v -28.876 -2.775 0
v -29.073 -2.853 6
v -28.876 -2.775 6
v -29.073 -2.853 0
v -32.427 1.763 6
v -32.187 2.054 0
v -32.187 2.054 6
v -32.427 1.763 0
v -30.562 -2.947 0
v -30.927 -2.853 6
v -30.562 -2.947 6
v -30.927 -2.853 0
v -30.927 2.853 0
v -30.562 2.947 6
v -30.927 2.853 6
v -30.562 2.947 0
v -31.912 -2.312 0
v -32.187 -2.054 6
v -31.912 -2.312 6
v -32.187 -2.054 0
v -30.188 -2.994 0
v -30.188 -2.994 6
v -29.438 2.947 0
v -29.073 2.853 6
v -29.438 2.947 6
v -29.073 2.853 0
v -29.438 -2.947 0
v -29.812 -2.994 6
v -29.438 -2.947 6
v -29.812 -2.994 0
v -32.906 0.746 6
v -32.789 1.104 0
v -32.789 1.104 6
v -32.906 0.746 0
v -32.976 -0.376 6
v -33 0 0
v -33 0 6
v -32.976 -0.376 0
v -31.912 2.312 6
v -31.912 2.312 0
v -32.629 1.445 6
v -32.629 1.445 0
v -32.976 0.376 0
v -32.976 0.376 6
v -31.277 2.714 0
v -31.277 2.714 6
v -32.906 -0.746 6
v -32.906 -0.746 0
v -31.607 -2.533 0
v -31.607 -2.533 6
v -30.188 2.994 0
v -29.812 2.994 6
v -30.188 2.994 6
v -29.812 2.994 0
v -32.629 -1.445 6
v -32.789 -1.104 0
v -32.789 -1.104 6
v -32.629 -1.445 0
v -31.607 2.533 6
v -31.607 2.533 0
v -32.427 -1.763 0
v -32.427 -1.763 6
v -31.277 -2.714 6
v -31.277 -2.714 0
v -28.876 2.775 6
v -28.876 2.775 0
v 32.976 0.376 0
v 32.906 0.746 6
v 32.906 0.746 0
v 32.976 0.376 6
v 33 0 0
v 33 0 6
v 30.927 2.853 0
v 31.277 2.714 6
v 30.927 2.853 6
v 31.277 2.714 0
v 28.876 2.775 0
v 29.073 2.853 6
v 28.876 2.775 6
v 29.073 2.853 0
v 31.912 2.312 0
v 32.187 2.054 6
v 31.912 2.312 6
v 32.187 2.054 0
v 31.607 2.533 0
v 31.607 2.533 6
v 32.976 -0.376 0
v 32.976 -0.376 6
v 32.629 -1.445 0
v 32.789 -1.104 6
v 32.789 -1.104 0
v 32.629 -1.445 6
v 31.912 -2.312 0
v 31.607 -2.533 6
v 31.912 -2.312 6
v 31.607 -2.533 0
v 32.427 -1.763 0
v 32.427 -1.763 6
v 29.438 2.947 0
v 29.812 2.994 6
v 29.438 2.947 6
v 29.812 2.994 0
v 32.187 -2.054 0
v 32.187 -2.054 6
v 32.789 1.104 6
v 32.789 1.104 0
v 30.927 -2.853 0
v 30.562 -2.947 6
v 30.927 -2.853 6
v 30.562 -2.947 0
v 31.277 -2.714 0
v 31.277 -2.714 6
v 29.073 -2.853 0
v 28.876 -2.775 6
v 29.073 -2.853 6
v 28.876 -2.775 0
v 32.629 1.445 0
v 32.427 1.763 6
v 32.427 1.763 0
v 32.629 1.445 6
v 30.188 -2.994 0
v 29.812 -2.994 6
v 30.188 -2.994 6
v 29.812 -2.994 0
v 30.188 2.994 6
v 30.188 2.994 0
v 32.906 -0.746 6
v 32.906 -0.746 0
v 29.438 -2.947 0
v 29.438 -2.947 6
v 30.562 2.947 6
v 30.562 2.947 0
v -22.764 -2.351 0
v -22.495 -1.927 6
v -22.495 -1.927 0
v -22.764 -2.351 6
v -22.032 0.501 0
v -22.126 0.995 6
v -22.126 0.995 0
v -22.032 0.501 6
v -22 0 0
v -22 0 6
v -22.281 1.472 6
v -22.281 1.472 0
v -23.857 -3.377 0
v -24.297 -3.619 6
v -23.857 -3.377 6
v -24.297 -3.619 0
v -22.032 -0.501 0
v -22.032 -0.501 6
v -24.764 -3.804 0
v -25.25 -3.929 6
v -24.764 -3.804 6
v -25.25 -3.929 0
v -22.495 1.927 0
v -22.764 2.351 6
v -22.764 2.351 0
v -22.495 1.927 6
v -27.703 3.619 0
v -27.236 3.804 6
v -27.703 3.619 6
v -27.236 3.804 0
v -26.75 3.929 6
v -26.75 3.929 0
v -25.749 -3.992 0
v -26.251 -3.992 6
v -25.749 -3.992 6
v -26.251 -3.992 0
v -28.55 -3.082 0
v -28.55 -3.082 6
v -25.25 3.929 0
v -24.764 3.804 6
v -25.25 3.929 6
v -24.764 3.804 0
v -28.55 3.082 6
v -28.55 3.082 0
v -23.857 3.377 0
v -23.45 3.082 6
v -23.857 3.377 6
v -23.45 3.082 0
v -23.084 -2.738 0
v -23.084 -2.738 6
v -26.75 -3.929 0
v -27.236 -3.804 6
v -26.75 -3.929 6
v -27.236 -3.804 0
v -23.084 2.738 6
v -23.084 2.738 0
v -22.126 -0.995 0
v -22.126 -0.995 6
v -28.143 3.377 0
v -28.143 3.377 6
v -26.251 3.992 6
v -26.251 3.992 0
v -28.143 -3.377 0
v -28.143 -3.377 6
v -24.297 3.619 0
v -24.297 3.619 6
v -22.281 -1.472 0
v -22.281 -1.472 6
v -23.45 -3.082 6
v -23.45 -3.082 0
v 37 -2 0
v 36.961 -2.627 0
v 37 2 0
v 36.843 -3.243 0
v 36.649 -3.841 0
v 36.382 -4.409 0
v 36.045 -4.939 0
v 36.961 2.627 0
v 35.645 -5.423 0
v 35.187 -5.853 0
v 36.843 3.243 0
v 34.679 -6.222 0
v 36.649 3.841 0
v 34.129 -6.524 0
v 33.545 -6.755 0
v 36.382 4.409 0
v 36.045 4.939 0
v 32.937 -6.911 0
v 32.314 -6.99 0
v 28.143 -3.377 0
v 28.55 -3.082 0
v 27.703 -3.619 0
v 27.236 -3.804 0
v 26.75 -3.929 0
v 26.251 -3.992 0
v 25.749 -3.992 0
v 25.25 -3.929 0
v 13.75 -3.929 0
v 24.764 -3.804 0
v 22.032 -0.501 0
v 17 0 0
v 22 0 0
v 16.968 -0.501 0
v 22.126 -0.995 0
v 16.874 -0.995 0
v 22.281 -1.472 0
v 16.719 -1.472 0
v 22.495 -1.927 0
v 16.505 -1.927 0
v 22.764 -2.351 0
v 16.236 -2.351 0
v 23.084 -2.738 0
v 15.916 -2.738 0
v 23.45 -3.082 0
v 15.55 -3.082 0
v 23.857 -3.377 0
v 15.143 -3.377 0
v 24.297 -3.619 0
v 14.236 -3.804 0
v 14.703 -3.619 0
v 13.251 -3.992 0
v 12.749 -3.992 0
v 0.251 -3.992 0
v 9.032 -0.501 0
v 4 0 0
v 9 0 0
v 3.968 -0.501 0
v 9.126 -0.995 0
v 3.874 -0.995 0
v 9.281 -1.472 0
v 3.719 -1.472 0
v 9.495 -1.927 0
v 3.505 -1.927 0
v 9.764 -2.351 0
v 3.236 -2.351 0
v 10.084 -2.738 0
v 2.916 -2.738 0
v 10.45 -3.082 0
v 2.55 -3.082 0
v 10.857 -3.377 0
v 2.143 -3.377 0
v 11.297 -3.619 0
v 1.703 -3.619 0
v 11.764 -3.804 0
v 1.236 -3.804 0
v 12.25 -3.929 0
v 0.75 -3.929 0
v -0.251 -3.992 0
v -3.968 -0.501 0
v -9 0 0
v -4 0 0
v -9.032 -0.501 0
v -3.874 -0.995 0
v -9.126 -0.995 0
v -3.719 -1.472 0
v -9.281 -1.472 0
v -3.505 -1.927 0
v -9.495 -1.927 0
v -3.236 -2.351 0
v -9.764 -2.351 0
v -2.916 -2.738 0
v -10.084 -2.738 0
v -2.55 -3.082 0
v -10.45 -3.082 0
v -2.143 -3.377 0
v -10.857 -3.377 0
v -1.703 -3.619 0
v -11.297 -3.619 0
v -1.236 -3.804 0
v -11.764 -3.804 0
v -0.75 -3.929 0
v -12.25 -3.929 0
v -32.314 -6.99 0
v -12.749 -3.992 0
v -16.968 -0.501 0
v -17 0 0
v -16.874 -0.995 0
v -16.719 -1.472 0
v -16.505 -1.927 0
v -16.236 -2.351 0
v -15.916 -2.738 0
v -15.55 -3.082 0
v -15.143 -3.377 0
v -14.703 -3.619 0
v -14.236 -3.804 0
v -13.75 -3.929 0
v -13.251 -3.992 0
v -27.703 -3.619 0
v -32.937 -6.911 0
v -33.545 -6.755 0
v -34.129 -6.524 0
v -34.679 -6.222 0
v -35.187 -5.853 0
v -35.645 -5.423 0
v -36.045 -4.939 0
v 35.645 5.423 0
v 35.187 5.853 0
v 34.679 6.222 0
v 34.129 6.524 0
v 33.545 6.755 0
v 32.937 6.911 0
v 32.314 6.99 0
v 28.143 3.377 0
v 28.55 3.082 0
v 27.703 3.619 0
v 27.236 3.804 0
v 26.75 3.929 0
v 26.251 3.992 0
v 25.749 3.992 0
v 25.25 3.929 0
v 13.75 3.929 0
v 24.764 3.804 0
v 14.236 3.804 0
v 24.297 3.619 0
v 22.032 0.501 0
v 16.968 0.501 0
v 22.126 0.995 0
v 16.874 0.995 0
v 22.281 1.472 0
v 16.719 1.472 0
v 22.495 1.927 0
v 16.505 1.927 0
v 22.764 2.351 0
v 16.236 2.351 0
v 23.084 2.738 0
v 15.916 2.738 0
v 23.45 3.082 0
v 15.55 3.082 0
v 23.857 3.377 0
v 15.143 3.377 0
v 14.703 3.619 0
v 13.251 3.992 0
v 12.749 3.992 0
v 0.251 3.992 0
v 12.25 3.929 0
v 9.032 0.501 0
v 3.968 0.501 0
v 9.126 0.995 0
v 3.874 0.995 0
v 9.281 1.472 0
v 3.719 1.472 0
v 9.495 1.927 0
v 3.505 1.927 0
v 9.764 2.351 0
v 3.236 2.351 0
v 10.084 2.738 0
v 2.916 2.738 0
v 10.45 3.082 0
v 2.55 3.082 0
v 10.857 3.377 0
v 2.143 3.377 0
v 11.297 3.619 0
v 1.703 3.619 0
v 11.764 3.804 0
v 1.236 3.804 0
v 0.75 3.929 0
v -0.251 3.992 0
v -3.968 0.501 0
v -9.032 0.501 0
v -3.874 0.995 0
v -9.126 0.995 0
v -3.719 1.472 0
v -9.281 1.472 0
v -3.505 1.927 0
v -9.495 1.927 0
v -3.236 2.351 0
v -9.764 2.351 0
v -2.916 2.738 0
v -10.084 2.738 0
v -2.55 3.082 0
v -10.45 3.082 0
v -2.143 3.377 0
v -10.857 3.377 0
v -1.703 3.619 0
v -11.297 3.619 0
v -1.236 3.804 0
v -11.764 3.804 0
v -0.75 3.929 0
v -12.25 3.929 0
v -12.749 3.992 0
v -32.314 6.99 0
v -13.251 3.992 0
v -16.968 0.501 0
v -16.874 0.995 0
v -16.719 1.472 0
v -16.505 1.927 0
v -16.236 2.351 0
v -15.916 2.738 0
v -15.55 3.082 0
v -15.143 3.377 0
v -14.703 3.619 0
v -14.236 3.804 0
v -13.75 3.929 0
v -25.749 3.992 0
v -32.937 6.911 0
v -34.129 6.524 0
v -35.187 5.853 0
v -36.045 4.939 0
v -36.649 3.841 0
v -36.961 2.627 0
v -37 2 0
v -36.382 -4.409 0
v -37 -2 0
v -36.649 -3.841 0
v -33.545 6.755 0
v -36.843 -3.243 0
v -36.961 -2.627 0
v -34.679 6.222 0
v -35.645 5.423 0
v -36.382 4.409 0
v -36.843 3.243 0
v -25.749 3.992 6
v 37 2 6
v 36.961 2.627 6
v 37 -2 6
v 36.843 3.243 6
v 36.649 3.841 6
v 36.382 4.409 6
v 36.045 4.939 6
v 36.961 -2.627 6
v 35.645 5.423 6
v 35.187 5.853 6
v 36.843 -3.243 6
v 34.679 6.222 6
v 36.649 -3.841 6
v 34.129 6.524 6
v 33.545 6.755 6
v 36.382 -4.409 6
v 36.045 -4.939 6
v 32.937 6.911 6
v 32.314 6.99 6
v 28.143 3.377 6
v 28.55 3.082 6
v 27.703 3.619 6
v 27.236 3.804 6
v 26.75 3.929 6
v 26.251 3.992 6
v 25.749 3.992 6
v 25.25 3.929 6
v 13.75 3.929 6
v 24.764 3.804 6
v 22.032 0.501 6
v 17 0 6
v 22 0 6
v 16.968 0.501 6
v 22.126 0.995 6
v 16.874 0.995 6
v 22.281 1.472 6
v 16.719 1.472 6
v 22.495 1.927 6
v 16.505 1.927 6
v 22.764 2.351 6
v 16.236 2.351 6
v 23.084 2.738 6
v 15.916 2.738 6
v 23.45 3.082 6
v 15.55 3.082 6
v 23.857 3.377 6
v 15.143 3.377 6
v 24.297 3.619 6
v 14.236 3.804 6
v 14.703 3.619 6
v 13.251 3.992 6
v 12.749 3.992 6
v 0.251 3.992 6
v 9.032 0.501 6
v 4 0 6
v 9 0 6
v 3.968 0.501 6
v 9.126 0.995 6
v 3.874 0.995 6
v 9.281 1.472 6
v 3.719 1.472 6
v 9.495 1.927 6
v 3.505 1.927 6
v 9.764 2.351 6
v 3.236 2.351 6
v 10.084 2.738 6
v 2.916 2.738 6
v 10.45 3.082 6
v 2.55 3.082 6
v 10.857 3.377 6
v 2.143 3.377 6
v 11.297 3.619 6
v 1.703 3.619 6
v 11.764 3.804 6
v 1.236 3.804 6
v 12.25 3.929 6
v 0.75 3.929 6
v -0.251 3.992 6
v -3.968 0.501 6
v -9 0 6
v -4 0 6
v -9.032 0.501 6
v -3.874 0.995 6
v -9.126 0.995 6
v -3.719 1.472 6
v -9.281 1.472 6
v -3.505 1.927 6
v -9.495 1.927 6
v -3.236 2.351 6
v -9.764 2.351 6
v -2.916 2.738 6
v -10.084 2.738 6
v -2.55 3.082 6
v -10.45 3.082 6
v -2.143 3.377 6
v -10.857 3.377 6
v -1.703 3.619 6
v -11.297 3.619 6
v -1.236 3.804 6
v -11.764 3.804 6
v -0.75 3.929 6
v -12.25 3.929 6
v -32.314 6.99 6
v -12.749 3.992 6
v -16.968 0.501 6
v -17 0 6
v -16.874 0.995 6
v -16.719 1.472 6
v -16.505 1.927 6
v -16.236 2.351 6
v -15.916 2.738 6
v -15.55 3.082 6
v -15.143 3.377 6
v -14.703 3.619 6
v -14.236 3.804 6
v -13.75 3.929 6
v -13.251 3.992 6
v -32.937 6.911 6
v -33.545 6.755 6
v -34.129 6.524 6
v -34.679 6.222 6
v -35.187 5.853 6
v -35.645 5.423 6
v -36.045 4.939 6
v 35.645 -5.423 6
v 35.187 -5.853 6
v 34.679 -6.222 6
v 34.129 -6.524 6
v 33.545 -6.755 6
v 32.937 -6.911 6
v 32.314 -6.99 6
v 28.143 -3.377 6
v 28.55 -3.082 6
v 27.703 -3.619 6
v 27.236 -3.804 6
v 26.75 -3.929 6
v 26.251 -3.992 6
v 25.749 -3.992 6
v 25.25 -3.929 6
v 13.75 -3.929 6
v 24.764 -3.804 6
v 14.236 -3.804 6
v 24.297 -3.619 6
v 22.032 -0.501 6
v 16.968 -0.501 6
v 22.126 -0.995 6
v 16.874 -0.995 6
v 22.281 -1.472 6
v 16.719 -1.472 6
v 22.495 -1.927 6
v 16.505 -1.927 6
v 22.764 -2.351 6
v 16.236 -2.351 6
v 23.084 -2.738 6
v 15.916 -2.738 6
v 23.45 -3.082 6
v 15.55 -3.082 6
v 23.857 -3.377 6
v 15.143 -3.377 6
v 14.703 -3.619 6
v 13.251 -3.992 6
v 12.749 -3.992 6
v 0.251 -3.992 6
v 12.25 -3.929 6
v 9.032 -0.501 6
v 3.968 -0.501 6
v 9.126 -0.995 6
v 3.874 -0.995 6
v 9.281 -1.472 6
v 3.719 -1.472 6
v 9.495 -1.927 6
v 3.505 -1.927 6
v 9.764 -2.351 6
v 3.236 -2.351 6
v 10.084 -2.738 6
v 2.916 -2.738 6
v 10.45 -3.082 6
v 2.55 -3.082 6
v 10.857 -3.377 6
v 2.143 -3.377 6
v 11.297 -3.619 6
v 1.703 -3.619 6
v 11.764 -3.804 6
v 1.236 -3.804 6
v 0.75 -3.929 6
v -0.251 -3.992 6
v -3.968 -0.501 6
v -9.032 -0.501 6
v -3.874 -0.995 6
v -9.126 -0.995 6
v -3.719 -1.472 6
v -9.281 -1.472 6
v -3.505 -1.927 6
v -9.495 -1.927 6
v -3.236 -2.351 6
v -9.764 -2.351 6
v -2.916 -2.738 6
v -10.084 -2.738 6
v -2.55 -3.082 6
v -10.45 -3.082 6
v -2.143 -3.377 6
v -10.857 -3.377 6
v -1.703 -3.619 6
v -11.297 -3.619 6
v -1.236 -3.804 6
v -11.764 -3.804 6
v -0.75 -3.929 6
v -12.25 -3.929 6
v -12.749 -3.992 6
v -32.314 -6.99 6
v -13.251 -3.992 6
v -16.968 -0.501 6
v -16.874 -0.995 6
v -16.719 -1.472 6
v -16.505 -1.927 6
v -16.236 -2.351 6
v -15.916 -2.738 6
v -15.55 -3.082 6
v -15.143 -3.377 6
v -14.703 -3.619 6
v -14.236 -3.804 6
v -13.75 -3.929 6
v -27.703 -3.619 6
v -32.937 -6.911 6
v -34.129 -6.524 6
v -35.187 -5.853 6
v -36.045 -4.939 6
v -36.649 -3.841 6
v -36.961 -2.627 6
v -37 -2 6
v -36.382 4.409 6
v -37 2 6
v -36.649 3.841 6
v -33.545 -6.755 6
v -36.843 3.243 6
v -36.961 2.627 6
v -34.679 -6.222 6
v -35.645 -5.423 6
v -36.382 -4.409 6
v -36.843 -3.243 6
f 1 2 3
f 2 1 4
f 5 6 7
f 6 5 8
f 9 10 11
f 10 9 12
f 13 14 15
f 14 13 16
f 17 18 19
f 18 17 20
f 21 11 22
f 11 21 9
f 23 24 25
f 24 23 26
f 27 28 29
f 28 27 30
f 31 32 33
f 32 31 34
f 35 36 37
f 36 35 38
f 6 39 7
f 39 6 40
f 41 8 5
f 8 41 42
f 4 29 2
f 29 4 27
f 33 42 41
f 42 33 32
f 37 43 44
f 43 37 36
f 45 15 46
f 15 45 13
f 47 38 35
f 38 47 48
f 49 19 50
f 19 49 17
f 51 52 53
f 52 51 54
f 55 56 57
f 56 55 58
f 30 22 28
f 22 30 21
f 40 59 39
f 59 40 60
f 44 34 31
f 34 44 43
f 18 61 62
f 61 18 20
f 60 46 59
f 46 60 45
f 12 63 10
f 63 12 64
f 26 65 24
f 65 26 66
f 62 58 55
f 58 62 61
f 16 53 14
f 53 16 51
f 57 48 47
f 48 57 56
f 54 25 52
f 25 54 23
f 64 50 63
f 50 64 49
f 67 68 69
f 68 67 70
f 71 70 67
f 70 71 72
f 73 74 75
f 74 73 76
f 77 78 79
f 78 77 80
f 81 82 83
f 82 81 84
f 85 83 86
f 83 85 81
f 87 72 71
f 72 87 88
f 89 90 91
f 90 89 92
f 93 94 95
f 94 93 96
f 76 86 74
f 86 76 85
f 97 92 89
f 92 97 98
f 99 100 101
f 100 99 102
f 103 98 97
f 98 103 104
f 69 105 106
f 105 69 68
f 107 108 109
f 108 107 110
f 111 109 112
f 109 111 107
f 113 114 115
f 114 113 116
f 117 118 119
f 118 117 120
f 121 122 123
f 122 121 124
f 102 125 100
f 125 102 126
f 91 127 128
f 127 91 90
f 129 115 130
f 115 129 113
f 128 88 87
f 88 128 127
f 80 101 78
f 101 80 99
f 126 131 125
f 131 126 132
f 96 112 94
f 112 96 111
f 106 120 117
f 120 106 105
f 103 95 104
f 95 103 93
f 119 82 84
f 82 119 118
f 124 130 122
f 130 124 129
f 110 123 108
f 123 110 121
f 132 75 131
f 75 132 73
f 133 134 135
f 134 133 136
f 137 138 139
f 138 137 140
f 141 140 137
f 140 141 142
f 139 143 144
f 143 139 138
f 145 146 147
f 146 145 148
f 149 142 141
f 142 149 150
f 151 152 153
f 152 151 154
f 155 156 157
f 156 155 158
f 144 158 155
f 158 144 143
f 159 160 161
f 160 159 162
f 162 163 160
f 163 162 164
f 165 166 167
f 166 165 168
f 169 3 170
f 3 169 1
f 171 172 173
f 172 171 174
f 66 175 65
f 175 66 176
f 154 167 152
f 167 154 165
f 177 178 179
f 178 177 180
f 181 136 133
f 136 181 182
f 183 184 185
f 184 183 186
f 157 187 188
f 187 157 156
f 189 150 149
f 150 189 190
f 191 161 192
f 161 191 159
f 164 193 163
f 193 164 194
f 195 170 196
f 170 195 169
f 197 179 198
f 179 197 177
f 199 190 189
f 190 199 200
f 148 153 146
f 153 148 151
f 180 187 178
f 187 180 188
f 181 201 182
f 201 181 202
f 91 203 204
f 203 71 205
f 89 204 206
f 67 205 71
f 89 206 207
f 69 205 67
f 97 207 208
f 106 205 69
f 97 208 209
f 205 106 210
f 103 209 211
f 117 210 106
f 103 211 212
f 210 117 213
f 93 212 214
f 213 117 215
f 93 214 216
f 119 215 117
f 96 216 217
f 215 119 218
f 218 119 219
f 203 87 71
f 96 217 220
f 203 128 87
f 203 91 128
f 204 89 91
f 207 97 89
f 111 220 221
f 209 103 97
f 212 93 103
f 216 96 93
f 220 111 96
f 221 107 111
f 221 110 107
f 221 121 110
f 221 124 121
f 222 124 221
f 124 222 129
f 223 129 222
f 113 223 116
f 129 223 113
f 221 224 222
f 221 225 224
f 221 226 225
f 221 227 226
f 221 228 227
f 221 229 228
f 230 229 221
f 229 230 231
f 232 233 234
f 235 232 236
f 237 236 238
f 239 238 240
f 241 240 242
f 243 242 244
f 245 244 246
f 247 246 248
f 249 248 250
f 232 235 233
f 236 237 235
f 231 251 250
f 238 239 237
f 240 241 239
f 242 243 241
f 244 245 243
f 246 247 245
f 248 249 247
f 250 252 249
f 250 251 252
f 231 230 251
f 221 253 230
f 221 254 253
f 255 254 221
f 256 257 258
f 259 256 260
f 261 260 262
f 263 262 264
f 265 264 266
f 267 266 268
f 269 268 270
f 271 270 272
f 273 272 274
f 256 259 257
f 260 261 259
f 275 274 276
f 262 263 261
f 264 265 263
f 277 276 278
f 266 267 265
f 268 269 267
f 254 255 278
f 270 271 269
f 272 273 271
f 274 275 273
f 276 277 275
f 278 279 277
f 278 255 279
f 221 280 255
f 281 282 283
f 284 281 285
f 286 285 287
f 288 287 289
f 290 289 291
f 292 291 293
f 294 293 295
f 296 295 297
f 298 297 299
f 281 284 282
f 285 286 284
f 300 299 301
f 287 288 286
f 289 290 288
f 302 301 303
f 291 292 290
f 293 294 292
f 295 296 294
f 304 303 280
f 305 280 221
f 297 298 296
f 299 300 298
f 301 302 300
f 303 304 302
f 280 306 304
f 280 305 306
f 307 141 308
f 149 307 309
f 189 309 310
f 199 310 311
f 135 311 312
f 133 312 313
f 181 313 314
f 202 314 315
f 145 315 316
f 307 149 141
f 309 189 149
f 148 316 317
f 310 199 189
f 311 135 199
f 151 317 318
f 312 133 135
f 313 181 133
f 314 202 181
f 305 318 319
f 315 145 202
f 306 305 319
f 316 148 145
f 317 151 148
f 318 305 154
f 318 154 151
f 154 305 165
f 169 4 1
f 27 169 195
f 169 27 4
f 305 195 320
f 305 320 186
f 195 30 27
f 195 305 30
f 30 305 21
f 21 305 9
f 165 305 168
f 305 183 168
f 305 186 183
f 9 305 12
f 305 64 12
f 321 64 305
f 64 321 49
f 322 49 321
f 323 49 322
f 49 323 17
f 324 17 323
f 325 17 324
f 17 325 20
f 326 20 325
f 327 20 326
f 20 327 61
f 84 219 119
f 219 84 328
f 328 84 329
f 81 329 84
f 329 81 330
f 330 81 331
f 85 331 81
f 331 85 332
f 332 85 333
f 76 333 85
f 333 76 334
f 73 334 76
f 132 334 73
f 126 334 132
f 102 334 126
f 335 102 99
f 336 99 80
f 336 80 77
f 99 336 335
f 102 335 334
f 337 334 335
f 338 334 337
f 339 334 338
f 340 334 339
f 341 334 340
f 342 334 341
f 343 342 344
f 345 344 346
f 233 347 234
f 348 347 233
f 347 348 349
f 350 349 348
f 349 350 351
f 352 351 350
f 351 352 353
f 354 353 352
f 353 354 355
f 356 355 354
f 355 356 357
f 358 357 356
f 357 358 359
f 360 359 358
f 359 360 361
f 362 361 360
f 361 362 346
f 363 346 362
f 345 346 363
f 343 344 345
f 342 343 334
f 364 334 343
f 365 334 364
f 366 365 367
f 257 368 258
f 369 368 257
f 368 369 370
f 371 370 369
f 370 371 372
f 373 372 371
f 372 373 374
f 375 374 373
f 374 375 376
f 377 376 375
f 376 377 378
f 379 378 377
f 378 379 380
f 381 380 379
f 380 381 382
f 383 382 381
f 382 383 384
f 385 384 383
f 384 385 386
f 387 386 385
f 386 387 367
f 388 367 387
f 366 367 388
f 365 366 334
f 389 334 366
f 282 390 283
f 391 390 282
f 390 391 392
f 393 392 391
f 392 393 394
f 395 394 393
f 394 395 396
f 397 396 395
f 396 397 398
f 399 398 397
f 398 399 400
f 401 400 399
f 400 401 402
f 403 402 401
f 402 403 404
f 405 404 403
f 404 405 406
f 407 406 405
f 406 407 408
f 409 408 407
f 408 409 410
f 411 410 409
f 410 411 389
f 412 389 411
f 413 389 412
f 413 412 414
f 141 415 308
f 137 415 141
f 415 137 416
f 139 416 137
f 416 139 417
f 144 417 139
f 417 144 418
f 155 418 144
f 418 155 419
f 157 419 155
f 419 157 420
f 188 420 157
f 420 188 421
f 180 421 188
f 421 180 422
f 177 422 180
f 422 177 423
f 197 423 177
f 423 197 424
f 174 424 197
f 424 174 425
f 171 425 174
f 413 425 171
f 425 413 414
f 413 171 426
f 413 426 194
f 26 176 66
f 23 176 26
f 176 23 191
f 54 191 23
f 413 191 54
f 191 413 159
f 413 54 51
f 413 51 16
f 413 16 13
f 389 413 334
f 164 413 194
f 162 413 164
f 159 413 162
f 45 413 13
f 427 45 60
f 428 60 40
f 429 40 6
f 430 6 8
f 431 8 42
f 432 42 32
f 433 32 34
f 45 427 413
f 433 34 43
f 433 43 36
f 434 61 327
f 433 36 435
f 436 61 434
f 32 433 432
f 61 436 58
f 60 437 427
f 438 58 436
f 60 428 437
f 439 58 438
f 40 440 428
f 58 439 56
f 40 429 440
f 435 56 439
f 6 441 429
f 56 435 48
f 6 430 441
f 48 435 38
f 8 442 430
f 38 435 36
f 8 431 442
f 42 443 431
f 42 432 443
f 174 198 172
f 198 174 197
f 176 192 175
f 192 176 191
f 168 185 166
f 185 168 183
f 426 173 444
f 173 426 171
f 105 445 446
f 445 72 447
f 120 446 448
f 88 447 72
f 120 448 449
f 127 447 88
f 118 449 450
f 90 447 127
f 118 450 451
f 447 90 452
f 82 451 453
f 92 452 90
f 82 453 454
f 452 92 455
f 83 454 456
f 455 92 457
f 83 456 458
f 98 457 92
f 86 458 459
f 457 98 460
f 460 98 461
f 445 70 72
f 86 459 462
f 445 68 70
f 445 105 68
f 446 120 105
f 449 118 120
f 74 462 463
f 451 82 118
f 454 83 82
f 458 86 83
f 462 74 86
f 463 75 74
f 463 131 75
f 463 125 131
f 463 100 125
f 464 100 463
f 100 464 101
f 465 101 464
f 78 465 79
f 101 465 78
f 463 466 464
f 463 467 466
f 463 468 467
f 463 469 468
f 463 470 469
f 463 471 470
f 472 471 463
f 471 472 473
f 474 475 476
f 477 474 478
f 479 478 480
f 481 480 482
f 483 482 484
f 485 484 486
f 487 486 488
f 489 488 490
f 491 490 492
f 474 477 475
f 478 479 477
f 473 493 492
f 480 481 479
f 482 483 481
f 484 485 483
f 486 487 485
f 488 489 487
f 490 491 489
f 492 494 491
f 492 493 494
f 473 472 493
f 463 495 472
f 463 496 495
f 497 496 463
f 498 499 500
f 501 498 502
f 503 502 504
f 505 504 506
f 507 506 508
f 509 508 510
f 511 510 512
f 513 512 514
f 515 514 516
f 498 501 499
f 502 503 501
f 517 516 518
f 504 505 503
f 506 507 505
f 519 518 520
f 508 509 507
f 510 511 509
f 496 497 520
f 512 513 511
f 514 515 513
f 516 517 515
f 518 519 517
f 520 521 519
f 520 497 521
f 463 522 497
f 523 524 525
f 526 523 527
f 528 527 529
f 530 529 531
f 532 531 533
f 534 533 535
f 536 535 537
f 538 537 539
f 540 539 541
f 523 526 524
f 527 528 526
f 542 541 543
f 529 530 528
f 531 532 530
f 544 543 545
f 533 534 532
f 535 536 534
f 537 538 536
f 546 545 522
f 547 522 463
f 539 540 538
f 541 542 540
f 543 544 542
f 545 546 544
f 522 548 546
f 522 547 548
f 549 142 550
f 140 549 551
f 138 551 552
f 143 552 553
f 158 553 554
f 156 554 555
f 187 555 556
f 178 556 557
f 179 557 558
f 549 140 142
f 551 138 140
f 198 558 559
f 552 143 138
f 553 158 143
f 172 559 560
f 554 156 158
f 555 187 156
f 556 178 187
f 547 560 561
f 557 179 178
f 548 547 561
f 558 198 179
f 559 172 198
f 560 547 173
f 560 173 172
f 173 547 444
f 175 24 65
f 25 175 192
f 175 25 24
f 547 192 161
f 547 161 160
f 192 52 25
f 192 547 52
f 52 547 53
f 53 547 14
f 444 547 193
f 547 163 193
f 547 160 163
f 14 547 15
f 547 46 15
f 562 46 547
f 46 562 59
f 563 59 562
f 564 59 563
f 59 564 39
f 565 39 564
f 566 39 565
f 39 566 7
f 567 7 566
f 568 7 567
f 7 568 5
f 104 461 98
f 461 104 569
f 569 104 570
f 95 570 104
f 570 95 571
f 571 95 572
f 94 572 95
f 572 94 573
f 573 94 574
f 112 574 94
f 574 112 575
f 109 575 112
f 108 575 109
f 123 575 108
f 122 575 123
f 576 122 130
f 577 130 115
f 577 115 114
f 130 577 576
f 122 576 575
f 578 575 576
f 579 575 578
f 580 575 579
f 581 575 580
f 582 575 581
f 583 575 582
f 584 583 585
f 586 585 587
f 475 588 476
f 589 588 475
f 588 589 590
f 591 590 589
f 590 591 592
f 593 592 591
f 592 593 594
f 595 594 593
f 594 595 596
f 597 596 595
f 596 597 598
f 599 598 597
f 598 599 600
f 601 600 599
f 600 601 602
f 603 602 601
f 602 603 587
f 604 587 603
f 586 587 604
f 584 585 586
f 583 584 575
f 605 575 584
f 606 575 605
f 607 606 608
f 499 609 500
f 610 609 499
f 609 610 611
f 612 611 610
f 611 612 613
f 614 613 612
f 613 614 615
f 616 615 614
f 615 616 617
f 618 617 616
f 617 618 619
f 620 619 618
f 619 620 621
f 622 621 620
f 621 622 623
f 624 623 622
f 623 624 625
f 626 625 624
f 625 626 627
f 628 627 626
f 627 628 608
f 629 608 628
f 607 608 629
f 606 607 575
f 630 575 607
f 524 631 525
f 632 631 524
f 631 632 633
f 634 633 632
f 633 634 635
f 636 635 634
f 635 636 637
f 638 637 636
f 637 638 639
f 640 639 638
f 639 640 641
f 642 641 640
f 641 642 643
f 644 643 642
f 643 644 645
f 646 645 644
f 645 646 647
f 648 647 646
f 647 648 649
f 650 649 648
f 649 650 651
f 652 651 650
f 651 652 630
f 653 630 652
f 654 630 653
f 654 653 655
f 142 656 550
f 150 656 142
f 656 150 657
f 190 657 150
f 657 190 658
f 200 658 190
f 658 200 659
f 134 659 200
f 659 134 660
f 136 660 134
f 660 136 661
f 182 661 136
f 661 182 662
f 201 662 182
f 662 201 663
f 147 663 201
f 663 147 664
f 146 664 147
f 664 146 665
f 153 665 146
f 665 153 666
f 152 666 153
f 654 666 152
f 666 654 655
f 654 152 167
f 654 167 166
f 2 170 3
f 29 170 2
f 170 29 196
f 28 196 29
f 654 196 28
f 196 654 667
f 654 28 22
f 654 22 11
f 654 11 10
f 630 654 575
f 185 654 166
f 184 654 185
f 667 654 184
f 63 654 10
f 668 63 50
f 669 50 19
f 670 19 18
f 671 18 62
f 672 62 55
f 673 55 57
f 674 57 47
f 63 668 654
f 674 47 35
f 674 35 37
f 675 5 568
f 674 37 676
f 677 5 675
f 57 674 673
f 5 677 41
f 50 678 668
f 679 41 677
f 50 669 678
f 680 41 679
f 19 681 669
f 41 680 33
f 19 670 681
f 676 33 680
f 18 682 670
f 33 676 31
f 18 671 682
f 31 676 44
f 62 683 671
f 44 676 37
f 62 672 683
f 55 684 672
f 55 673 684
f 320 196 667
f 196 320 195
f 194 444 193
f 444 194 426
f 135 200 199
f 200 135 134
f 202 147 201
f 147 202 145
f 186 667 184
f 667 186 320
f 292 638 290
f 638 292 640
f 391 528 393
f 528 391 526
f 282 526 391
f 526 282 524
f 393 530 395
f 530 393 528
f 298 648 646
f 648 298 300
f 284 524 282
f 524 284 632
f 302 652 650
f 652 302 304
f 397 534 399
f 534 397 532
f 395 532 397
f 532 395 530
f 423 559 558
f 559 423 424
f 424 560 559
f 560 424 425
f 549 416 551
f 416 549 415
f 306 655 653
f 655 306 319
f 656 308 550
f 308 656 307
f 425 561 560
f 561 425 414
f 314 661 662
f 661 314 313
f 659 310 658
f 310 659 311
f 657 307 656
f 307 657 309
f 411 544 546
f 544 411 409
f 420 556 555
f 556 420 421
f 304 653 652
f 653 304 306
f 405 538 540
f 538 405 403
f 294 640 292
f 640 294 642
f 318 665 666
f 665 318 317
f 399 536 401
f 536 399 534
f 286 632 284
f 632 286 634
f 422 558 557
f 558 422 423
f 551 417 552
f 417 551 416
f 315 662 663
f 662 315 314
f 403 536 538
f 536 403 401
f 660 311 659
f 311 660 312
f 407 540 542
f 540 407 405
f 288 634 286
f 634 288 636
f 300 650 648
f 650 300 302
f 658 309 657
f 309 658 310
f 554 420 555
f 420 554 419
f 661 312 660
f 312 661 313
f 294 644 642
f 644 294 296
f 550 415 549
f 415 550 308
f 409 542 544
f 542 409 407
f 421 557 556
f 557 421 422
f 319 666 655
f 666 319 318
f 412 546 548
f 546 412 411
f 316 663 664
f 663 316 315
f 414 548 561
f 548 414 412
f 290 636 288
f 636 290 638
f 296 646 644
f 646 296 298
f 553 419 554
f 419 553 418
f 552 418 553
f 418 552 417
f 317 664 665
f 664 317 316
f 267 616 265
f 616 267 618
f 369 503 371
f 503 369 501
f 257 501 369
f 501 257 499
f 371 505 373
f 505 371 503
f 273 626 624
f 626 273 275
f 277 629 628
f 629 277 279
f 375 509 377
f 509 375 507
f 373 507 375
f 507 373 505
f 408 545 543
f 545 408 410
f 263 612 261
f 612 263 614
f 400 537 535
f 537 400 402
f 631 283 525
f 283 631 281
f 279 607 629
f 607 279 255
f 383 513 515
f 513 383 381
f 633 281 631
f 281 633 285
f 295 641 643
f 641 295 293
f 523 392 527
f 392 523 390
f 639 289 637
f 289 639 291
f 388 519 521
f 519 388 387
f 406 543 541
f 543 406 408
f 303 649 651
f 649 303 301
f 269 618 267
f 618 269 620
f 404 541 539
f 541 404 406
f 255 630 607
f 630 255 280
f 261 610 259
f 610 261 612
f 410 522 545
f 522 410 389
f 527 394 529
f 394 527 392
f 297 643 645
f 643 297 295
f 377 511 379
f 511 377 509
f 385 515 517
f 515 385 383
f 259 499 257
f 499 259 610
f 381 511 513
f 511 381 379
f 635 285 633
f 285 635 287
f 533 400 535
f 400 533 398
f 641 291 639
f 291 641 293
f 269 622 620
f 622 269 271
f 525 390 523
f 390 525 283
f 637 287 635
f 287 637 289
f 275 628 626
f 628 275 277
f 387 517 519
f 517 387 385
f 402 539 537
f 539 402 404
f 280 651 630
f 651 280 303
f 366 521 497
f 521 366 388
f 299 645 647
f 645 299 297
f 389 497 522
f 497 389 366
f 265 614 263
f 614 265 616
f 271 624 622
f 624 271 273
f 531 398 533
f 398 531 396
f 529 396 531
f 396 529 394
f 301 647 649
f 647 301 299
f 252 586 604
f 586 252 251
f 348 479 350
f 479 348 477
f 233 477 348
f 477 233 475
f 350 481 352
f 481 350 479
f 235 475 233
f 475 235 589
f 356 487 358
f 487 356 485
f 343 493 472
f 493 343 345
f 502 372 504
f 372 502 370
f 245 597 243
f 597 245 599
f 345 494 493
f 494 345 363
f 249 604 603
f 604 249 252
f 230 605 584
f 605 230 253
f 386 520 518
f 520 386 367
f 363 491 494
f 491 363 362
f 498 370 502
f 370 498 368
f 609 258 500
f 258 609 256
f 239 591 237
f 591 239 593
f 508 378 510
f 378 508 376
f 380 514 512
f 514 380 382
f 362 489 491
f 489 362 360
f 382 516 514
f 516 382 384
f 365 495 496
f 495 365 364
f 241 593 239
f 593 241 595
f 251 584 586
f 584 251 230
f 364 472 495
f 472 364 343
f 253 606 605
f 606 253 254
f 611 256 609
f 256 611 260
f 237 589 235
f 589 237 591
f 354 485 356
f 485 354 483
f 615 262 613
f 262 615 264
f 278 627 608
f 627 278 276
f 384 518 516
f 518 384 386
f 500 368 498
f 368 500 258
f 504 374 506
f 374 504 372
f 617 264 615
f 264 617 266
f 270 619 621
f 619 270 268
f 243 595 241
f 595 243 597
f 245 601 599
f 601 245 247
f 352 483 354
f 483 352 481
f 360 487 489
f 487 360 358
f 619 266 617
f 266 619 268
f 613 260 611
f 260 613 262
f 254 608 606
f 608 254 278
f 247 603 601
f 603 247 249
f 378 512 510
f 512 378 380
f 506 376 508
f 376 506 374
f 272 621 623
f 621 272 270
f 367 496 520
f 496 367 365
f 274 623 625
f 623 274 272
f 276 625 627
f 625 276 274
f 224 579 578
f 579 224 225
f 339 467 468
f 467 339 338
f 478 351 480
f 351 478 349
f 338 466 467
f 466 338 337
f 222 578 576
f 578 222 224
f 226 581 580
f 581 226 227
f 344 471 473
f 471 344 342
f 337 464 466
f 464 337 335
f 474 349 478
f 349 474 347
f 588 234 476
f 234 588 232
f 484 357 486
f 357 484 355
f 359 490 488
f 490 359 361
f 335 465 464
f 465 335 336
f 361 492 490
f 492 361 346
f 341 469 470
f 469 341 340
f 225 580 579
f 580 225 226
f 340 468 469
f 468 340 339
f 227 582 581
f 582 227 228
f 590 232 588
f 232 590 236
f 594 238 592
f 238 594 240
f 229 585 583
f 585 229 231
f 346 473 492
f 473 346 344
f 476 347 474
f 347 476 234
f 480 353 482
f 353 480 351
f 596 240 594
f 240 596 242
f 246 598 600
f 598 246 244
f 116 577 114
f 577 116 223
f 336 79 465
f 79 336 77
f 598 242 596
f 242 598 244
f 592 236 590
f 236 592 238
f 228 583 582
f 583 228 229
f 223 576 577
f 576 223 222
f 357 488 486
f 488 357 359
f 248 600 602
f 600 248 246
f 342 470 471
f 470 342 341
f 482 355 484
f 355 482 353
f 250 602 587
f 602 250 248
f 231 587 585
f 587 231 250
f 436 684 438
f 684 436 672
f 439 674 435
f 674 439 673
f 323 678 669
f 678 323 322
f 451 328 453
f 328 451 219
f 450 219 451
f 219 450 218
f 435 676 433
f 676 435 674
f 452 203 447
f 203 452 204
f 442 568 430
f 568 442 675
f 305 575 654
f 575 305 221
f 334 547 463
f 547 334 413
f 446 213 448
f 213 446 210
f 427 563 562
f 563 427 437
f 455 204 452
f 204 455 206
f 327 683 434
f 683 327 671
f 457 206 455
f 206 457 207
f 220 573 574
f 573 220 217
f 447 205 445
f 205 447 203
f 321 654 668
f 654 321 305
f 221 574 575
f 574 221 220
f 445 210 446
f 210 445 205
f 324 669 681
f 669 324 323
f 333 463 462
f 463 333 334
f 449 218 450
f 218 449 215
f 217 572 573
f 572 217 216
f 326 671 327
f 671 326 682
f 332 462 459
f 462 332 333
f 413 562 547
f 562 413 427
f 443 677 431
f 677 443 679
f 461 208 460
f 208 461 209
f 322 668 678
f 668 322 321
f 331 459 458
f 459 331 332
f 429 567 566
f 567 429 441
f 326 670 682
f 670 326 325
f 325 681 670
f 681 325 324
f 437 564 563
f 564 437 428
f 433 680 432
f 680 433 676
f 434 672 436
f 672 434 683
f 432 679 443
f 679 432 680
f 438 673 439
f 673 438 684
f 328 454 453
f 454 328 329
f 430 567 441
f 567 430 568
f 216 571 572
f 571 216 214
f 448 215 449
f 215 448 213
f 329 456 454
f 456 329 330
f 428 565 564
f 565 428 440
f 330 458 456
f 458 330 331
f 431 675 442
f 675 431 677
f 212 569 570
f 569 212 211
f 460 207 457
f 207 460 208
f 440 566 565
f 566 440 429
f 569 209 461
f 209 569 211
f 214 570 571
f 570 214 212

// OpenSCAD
$fn = 50;


difference() {
	union() {
		hull() {
			translate(v = [-32.0000000000, 2.0000000000, 0]) {
				cylinder(h = 6, r = 5);
			}
			translate(v = [32.0000000000, 2.0000000000, 0]) {
				cylinder(h = 6, r = 5);
			}
			translate(v = [-32.0000000000, -2.0000000000, 0]) {
				cylinder(h = 6, r = 5);
			}
			translate(v = [32.0000000000, -2.0000000000, 0]) {
				cylinder(h = 6, r = 5);
			}
		}
	}
	union() {
		#translate(v = [-30.0000000000, 0.0000000000, -100.0000000000]) {
			cylinder(h = 200, r = 3.0000000000);
		}
		#translate(v = [-30.0000000000, 0.0000000000, -100.0000000000]) {
			cylinder(h = 200, r = 3.0000000000);
		}
		#translate(v = [30.0000000000, 0.0000000000, -100.0000000000]) {
			cylinder(h = 200, r = 3.0000000000);
		}
		#translate(v = [30.0000000000, 0.0000000000, -100.0000000000]) {
			cylinder(h = 200, r = 3.0000000000);
		}
		#translate(v = [-26.0000000000, 0, 0]) {
			cylinder(h = 6, r = 4.0000000000);
		}
		#translate(v = [-13.0000000000, 0, 0]) {
			cylinder(h = 6, r = 4.0000000000);
		}
		#cylinder(h = 6, r = 4.0000000000);
		#translate(v = [13.0000000000, 0, 0]) {
			cylinder(h = 6, r = 4.0000000000);
		}
		#translate(v = [26.0000000000, 0, 0]) {
			cylinder(h = 6, r = 4.0000000000);
		}
	}
}
